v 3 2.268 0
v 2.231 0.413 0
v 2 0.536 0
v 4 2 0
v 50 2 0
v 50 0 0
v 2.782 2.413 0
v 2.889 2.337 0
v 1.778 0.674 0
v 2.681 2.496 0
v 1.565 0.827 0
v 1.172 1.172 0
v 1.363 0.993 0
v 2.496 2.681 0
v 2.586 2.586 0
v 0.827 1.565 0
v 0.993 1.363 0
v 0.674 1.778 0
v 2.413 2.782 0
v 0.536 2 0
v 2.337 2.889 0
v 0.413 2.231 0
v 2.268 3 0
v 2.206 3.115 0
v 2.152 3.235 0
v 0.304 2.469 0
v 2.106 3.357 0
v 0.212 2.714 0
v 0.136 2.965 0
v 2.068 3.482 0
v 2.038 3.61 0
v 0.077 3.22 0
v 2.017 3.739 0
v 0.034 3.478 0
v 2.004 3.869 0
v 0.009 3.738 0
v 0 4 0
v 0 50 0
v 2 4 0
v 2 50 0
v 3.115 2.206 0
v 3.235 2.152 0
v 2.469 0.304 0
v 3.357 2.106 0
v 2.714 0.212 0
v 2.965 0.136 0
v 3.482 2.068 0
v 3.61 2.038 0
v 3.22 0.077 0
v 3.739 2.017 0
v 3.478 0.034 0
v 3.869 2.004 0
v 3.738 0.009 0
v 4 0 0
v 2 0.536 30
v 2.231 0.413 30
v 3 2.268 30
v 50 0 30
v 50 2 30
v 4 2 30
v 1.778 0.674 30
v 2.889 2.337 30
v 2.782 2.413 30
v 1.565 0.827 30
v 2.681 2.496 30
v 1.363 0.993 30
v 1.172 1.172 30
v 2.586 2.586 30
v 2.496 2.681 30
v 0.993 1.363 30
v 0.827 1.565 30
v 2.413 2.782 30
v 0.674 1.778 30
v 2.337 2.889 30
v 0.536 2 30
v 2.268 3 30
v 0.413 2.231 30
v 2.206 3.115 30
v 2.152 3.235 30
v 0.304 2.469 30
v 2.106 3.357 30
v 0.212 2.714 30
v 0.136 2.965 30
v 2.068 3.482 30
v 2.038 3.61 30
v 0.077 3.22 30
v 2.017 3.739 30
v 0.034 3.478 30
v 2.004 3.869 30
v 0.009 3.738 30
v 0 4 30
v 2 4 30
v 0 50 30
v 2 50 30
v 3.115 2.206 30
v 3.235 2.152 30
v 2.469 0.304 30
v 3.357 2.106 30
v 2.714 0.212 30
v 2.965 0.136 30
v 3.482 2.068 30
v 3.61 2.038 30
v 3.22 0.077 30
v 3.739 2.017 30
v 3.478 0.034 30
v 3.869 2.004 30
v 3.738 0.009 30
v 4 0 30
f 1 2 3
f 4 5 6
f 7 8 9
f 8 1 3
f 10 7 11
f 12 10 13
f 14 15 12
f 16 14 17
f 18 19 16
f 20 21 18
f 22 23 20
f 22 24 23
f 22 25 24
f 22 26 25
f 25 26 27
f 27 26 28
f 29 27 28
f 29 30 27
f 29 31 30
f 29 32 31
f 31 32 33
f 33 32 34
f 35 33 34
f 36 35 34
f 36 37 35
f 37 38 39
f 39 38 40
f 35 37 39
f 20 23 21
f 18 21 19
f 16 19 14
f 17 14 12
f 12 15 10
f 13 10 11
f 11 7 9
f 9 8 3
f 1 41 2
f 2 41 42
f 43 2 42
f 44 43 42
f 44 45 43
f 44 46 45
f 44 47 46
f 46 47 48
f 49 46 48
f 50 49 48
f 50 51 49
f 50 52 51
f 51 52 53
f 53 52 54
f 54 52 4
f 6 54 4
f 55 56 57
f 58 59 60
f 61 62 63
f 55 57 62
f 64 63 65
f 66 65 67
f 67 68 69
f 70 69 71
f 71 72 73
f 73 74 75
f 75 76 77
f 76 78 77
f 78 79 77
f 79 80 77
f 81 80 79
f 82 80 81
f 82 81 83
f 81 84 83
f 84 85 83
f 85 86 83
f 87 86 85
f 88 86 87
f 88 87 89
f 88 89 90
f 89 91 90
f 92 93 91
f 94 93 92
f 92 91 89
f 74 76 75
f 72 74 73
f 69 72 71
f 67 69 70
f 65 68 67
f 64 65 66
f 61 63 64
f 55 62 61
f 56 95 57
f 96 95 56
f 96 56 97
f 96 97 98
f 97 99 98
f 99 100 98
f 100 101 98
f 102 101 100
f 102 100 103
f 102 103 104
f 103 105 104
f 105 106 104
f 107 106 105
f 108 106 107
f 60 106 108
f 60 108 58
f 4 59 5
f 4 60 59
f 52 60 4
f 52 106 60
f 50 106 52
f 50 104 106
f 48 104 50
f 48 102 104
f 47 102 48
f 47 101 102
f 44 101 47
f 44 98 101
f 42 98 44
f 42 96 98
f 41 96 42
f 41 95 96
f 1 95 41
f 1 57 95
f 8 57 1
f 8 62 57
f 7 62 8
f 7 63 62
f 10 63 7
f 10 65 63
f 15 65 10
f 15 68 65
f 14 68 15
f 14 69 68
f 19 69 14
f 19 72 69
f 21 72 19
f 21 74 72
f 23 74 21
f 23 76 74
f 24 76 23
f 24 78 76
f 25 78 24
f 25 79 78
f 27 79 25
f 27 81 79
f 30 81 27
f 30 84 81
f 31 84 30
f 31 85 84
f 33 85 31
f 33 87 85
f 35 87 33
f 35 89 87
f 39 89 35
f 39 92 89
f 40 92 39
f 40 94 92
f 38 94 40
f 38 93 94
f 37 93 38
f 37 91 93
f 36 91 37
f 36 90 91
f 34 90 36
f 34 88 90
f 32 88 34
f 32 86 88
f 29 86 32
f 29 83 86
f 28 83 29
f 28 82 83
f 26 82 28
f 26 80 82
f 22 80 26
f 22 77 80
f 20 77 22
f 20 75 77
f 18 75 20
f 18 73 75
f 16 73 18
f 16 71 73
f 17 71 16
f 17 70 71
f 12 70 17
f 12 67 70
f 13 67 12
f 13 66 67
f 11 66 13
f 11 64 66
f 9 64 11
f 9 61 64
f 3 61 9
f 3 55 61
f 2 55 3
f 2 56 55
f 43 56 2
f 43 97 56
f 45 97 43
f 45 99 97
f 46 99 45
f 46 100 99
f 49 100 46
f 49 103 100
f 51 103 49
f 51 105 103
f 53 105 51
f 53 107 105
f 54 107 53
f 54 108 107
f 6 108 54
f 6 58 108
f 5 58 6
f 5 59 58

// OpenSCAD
$fn = 96;

thickness_mm = 2.0;
bend_radius_mm = 2.0;
outside_length_a_mm = 50.0;
outside_length_b_mm = 50.0;
width_mm = 30.0;
bend_angle_deg = 90.0;
k_factor = 0.45;

outer_radius_mm = bend_radius_mm + thickness_mm;
setback_mm = outer_radius_mm * tan(bend_angle_deg / 2.0);
bend_allowance_mm = (bend_angle_deg * PI / 180.0) * (bend_radius_mm + k_factor * thickness_mm);
flat_length_mm = outside_length_a_mm + outside_length_b_mm - 2.0 * setback_mm + bend_allowance_mm;

echo(str(
    "MAKERBENCH-SHEETMETAL: {\"thickness_mm\": ",
    thickness_mm,
    ", \"bend_radius_mm\": ",
    bend_radius_mm,
    ", \"flat_length_mm\": ",
    flat_length_mm,
    "}"
));

function arc_points(cx, cy, r, a0, a1, n = 24) =
    [for (i = [0 : n]) let(a = a0 + (a1 - a0) * i / n) [cx + r * cos(a), cy + r * sin(a)]];

module l_bracket() {
    polygon(points = concat(
        [[outer_radius_mm, 0]],
        [[outside_length_a_mm, 0]],
        [[outside_length_a_mm, thickness_mm]],
        [[outer_radius_mm, thickness_mm]],
        arc_points(outer_radius_mm, outer_radius_mm, bend_radius_mm, -90, -180, 24),
        [[thickness_mm, outside_length_b_mm]],
        [[0, outside_length_b_mm]],
        [[0, outer_radius_mm]],
        arc_points(outer_radius_mm, outer_radius_mm, outer_radius_mm, 180, 270, 24)
    ));
}

linear_extrude(height = width_mm, center = false, convexity = 10)
    l_bracket();
